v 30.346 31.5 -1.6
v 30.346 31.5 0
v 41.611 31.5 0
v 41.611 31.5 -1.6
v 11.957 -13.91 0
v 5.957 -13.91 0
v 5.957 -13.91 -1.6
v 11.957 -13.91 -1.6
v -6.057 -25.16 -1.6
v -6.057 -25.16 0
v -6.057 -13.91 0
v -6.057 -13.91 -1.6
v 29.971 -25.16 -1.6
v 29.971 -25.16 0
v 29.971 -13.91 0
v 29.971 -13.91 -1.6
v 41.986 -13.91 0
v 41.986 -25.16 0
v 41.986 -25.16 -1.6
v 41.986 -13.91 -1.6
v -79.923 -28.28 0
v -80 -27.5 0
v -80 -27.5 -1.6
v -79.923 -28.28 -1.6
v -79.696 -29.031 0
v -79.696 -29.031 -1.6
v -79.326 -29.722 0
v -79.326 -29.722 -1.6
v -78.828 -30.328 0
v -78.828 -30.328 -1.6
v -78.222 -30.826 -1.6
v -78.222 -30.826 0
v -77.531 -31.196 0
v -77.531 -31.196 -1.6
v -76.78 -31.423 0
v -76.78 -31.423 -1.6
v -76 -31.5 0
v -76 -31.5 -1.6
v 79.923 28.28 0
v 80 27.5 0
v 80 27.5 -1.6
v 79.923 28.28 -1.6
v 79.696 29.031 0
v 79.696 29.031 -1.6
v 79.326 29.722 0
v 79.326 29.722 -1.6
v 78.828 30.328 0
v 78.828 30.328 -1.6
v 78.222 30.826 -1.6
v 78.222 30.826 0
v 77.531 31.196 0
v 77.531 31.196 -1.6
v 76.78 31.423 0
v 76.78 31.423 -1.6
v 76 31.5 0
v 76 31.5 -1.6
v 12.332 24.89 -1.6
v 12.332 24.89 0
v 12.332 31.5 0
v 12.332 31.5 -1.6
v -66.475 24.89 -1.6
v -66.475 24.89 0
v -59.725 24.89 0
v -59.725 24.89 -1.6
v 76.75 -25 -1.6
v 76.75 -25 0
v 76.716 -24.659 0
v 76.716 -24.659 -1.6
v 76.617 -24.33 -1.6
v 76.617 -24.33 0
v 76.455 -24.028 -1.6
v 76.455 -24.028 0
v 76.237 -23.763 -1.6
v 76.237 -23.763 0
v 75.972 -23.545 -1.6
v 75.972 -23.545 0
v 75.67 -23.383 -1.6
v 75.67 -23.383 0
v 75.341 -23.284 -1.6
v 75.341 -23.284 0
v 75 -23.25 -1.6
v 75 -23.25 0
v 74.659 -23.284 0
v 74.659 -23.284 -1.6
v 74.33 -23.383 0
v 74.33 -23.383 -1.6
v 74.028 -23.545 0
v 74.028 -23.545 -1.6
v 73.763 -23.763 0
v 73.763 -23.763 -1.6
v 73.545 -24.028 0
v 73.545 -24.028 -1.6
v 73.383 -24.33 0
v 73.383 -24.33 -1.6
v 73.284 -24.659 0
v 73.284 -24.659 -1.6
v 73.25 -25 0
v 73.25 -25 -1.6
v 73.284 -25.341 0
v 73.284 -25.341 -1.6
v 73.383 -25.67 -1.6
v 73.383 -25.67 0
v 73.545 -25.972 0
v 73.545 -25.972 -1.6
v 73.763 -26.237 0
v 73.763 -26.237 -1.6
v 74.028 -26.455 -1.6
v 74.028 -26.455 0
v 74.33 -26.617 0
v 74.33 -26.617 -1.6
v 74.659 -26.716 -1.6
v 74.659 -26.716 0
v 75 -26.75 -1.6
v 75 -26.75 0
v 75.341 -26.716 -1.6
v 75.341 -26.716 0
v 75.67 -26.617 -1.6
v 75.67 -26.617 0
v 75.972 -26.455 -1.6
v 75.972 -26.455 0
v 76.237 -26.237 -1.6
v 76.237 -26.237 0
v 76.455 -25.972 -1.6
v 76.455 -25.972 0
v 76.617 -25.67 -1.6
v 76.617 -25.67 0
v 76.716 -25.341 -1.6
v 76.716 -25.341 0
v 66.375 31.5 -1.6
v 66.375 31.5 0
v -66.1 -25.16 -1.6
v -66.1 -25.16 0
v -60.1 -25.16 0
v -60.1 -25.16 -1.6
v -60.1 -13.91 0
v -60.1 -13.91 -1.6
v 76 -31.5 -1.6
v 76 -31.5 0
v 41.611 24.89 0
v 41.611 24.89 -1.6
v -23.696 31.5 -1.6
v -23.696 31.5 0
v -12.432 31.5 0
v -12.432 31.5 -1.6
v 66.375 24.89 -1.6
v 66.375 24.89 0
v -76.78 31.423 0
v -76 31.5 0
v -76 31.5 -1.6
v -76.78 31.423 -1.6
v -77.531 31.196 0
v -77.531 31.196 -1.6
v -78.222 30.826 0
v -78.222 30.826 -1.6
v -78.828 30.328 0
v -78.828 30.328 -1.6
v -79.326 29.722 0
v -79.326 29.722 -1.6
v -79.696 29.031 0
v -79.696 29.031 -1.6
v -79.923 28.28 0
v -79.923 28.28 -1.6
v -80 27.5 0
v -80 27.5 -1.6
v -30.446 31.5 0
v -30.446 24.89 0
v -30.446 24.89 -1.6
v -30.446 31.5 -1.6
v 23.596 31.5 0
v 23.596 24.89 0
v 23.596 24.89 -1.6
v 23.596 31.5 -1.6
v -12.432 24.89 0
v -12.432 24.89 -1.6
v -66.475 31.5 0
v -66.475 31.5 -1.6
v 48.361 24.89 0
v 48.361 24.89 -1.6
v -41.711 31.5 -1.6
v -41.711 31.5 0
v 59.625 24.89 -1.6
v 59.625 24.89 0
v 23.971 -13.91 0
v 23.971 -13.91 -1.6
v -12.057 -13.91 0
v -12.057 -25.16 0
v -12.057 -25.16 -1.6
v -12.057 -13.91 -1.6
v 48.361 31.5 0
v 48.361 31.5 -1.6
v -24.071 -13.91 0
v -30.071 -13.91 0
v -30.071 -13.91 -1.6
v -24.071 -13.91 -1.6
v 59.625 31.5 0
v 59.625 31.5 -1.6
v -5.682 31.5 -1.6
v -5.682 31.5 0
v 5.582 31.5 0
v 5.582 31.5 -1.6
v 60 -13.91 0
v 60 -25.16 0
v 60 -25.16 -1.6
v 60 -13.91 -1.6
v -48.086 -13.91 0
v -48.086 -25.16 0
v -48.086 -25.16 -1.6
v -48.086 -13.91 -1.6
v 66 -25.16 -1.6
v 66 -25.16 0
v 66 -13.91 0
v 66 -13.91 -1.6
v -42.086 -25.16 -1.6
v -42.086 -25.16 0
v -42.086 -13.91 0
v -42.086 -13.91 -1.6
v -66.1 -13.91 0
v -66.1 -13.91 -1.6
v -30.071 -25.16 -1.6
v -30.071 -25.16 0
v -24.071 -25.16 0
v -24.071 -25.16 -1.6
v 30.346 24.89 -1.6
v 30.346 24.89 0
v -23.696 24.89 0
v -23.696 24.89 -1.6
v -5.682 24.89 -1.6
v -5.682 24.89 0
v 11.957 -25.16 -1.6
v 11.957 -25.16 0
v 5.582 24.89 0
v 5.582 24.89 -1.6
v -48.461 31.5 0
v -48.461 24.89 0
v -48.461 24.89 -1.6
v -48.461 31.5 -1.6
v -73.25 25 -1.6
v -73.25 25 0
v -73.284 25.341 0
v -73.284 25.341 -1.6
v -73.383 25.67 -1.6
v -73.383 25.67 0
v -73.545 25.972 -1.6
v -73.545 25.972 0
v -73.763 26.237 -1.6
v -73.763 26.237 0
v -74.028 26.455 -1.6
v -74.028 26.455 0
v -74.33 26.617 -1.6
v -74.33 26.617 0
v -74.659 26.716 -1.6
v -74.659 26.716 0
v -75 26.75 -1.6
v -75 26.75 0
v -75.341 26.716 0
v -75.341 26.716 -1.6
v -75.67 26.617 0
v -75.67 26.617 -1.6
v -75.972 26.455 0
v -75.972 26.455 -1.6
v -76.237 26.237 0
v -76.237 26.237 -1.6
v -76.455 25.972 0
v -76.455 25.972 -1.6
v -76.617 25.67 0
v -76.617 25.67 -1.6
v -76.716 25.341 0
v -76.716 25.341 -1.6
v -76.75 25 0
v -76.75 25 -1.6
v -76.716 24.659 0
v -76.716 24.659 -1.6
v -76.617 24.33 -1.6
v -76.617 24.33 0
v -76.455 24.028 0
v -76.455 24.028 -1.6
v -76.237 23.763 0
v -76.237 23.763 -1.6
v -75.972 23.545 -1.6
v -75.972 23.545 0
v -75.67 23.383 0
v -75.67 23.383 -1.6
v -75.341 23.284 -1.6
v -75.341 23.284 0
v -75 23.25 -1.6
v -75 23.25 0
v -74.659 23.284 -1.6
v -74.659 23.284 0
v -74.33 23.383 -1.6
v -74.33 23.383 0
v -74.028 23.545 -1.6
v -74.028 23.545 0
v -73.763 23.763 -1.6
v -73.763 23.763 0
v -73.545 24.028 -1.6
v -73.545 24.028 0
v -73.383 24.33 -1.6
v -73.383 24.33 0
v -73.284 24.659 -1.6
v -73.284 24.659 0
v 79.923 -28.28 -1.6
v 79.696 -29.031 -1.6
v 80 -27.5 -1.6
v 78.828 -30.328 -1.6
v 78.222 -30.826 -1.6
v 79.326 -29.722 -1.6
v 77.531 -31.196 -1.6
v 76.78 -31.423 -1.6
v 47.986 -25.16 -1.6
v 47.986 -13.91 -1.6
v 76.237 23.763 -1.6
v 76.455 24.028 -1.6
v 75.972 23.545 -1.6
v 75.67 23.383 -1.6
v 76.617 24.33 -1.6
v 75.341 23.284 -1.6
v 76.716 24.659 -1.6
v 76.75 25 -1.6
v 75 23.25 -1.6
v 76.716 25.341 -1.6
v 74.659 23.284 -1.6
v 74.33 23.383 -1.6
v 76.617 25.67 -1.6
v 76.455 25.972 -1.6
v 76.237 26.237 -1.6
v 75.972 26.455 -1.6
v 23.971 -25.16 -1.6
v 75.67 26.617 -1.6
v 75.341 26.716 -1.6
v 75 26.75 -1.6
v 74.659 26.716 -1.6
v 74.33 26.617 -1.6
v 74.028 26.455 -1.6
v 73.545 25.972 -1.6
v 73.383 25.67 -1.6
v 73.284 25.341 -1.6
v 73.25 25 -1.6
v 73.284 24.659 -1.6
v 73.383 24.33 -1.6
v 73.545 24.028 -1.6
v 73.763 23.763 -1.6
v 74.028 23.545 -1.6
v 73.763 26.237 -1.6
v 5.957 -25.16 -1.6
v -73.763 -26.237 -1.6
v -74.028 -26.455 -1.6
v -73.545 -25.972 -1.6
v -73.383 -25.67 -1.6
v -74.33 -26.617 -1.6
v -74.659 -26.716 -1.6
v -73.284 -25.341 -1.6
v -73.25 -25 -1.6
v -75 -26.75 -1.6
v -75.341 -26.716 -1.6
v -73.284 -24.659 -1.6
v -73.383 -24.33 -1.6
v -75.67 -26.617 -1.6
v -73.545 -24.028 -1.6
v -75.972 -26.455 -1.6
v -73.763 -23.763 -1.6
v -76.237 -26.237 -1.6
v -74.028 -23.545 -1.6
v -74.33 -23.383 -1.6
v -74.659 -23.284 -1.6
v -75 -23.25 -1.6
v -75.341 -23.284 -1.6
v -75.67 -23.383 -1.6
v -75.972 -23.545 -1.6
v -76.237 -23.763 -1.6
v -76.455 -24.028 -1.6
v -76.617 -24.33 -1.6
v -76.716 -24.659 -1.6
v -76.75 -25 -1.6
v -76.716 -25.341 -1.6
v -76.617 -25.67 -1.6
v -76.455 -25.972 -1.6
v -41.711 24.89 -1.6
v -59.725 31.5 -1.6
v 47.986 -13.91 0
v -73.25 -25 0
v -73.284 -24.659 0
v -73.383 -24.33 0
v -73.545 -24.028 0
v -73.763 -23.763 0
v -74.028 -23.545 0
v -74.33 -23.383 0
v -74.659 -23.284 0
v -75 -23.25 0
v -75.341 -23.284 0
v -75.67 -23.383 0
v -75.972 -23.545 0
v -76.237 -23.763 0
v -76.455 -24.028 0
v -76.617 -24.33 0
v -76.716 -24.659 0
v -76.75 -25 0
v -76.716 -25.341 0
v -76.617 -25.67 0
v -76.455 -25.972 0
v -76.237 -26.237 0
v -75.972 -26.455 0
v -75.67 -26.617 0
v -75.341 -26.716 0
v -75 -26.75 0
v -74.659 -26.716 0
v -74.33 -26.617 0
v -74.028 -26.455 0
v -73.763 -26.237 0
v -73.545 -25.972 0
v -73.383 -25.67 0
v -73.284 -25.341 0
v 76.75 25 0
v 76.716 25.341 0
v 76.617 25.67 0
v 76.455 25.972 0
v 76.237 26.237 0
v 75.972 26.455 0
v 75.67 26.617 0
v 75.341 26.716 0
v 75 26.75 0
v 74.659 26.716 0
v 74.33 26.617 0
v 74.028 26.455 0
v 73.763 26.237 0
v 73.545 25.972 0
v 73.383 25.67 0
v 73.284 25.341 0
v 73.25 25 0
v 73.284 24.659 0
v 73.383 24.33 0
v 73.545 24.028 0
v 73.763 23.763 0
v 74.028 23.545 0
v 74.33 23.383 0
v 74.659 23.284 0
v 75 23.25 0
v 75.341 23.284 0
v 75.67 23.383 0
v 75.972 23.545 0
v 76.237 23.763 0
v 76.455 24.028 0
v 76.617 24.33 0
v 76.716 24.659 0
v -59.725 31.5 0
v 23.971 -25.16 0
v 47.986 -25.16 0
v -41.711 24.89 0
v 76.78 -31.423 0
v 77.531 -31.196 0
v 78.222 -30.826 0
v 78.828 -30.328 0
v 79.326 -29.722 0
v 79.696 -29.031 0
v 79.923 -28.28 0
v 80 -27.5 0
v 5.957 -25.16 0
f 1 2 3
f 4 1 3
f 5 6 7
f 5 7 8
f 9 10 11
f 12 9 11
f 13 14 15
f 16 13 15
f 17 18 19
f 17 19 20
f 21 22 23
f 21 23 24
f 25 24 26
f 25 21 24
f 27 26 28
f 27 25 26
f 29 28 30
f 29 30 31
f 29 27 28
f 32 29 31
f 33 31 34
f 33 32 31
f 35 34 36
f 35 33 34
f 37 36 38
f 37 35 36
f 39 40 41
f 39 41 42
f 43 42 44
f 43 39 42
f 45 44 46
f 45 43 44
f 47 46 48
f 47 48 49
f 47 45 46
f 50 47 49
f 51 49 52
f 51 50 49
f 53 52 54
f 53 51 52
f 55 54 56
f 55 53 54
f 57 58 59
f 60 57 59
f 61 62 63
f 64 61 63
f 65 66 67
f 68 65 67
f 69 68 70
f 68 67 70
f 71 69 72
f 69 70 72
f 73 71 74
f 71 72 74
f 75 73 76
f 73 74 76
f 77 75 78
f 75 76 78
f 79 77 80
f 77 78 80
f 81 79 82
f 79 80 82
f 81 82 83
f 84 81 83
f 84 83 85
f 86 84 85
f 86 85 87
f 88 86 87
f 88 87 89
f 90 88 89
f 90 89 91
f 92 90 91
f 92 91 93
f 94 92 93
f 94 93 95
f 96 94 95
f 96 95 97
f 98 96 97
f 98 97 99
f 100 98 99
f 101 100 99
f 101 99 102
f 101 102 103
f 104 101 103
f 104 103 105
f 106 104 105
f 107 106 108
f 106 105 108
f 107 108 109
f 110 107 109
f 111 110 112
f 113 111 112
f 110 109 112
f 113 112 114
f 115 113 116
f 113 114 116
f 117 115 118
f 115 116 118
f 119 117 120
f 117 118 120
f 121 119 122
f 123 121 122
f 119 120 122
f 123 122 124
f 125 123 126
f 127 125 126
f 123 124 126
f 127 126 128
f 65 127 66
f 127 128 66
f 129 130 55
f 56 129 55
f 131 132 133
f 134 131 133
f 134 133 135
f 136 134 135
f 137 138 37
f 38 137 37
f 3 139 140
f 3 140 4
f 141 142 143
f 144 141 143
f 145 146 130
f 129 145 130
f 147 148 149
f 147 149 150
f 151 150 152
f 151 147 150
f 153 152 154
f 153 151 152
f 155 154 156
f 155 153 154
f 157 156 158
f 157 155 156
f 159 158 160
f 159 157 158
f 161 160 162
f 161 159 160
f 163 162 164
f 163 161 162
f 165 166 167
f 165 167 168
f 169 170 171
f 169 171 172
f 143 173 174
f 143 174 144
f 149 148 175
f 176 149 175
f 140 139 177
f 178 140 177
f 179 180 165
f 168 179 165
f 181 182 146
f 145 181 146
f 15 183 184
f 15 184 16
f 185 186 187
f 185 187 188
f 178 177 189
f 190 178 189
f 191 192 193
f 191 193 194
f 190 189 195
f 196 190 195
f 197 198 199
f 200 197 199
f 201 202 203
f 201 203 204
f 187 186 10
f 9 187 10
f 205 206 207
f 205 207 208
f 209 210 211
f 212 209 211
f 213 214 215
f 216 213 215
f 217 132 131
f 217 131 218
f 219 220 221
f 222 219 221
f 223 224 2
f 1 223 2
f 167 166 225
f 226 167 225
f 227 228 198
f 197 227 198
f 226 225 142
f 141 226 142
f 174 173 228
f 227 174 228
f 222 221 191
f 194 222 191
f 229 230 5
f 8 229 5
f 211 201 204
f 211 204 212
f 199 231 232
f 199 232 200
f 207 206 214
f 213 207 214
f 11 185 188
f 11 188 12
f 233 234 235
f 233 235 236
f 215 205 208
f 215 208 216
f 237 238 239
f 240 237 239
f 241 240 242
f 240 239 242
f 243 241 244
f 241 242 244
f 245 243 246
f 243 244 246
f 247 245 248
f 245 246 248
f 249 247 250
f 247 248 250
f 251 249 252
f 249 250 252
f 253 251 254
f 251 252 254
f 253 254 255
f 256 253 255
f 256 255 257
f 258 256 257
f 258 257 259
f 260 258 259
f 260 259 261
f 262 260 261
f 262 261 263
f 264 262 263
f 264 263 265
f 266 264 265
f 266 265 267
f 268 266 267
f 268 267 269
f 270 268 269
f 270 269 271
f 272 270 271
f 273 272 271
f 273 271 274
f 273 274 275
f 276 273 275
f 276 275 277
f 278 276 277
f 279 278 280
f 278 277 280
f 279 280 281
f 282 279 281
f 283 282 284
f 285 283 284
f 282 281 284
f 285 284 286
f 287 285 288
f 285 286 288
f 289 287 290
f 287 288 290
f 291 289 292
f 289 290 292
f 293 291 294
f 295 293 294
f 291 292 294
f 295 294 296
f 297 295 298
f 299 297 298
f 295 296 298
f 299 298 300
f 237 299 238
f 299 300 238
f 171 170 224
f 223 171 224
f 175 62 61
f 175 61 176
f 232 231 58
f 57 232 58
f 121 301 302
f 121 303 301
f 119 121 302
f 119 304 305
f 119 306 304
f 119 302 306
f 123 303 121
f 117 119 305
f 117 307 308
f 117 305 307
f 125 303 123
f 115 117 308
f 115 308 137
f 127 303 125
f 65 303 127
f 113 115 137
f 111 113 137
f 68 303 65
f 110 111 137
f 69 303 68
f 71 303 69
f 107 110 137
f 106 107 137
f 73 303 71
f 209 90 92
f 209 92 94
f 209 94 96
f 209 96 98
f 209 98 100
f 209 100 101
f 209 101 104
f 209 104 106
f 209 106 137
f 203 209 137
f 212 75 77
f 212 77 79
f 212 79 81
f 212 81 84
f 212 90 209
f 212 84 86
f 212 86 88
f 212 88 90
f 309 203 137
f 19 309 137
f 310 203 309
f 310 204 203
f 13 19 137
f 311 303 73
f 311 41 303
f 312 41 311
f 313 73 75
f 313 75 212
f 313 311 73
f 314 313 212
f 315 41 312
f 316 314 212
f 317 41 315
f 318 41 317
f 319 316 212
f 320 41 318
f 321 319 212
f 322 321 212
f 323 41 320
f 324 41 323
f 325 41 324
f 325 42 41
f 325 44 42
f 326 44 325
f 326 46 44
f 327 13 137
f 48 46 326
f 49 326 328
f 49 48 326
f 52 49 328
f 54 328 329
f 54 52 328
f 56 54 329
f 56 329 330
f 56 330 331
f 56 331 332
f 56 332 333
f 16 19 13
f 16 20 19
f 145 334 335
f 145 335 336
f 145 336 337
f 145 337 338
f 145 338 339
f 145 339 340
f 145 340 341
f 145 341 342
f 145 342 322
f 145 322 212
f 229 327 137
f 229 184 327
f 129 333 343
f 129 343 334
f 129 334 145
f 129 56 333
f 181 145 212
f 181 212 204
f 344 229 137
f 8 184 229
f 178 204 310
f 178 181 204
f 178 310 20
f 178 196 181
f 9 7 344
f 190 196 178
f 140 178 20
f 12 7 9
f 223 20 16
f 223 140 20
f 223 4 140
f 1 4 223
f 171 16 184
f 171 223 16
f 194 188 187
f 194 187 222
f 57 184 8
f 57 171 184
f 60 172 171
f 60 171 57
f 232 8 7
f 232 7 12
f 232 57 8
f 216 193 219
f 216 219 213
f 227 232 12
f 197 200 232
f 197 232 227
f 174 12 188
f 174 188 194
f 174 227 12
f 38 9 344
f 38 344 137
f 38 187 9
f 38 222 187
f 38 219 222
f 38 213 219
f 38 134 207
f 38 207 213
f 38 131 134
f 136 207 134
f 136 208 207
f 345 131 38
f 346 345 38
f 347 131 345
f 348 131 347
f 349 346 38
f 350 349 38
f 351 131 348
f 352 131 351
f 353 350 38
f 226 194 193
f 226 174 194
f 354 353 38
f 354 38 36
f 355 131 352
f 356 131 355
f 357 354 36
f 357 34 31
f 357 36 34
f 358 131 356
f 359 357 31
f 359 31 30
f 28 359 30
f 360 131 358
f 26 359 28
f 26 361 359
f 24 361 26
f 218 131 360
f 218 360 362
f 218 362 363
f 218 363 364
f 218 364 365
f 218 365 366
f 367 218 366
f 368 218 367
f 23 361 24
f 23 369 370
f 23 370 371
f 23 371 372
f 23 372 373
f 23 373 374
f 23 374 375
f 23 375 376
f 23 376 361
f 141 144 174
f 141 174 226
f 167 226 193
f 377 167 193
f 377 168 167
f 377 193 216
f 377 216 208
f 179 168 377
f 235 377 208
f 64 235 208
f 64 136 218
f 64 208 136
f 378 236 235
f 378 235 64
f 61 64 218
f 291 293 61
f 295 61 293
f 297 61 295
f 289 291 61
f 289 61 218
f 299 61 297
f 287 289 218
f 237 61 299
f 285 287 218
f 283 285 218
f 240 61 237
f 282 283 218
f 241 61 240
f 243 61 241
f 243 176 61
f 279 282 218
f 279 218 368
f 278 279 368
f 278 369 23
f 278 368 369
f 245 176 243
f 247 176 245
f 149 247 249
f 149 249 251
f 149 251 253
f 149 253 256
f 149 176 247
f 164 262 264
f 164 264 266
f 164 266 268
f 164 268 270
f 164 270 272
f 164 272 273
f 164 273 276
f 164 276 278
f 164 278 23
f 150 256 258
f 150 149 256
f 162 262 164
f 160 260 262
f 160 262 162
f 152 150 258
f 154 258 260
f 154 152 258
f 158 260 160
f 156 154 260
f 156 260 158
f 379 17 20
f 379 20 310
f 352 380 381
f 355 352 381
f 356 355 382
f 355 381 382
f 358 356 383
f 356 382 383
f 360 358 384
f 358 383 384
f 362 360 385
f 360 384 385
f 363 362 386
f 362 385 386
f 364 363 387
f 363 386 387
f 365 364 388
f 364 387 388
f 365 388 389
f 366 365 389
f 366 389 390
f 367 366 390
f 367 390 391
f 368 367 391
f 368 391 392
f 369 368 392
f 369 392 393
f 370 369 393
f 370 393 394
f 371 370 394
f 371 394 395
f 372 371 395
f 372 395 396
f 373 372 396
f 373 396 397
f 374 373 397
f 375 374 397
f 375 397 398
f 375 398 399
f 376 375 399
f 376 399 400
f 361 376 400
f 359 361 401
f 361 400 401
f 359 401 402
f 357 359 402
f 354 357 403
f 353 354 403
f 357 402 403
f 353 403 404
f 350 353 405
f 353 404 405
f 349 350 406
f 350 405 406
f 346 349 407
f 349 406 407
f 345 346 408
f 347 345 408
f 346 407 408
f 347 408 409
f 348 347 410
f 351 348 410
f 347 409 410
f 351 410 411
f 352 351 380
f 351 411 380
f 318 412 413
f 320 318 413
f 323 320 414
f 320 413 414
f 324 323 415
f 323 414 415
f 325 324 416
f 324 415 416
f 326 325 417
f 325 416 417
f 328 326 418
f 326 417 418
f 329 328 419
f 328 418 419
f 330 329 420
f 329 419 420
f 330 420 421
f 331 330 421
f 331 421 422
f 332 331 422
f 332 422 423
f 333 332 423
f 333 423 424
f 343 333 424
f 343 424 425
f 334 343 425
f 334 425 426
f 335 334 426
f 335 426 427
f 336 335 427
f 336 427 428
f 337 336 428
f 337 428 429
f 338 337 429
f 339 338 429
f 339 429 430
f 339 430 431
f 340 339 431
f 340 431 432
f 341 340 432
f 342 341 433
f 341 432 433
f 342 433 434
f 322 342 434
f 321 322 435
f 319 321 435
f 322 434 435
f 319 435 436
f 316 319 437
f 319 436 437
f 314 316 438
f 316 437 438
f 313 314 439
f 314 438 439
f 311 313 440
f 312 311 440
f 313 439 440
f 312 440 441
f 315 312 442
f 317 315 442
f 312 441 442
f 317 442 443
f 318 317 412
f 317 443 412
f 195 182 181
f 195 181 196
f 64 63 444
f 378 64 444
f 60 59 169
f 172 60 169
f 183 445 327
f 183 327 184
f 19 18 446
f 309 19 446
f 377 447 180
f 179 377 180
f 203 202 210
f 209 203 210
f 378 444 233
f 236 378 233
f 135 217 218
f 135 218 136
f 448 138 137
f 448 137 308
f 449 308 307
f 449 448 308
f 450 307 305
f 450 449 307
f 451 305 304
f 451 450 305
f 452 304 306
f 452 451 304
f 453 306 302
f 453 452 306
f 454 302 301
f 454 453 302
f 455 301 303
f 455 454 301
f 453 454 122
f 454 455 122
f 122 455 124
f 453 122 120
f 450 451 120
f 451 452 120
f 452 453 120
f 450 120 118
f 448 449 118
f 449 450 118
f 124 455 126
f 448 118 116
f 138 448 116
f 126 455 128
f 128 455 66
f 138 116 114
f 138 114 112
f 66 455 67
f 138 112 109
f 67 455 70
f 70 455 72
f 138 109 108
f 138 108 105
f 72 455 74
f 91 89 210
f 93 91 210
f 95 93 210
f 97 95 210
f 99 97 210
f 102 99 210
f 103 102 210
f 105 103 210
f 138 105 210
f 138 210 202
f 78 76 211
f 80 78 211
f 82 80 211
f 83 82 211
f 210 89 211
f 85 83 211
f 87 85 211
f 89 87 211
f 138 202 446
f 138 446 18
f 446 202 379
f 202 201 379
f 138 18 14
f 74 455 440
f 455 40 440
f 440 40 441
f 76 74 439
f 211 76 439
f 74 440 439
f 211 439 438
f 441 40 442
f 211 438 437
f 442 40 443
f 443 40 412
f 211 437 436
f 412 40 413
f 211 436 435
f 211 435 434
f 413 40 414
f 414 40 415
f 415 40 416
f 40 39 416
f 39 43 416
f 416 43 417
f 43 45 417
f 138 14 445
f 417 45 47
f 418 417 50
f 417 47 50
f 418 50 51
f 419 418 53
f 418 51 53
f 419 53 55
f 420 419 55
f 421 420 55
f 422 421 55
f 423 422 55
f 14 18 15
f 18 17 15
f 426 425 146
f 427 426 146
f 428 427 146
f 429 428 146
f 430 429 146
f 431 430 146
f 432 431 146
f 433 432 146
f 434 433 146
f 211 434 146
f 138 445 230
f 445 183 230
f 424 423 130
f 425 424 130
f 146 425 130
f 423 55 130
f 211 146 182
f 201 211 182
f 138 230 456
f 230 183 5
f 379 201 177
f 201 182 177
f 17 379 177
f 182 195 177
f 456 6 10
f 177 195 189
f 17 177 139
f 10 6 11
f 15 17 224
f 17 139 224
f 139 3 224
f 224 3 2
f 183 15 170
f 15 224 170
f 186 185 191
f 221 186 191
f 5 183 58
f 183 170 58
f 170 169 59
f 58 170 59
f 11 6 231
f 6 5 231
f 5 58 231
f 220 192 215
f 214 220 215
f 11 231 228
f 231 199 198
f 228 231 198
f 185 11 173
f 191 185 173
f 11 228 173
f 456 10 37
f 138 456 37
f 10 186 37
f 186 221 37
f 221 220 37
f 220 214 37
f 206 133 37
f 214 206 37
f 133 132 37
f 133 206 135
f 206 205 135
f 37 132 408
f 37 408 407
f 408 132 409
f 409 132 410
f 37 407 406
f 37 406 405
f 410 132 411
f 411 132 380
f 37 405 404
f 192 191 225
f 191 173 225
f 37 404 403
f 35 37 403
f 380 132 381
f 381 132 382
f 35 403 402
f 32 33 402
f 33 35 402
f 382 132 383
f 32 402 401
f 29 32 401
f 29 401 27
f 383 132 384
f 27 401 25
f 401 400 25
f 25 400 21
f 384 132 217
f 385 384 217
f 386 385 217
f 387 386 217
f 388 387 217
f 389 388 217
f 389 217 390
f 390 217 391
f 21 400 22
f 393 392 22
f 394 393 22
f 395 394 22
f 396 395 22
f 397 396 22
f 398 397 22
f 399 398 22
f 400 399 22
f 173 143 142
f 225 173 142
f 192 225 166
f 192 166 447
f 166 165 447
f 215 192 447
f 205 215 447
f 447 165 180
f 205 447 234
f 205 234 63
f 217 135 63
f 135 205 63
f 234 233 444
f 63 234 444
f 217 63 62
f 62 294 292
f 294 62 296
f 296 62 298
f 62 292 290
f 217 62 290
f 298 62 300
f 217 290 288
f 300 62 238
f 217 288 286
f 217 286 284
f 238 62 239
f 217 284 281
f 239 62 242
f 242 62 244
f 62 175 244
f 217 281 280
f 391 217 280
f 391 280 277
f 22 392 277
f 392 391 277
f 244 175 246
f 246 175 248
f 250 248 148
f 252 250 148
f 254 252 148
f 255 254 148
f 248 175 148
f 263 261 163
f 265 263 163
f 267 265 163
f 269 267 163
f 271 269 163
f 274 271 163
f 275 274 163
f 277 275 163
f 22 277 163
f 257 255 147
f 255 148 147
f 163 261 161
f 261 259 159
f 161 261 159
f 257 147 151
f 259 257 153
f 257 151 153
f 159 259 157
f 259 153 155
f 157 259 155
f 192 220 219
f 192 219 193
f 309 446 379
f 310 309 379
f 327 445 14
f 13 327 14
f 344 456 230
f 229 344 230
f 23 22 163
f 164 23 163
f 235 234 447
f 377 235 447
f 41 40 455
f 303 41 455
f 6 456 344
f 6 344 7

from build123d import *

# Parameters (mm, degrees)
PAD_DEPTH              = 1.6
SKETCH001_R            = 1.75
POCKET_DEPTH           = 5
SKETCH003_W            = 6
SKETCH003_H            = 11.25
POCKET001_DEPTH        = 5
LINEARPATTERN_COUNT    = 8
LINEARPATTERN_PITCH    = 18.014286
SKETCH004_W            = 6.75
SKETCH004_H            = 7.75
POCKET002_DEPTH        = 5
LINEARPATTERN001_COUNT = 8
LINEARPATTERN001_PITCH = 18.014286


with BuildPart() as part:
    # Sketch → Pad (new body)
    with BuildSketch(Plane.XY):
        with BuildLine():
            Line((-76, 31.5), (76, 31.5))
            ThreePointArc((80, 27.5), (78.828427, 30.328427), (76, 31.5))
            Line((80, 27.5), (80, -27.5))
            ThreePointArc((76, -31.5), (78.828427, -30.328427), (80, -27.5))
            Line((76, -31.5), (-76, -31.5))
            ThreePointArc((-80, -27.5), (-78.828427, -30.328427), (-76, -31.5))
            Line((-80, -27.5), (-80, 27.5))
            ThreePointArc((-76, 31.5), (-78.828427, 30.328427), (-80, 27.5))
        make_face()
    extrude(amount=-PAD_DEPTH)

    # Sketch001 → Pocket (cut)
    with BuildSketch(Plane.XY):
        with Locations((75, 25)):
            Circle(SKETCH001_R)
        with Locations((-75, 25)):
            Circle(SKETCH001_R)
        with Locations((75, -25)):
            Circle(SKETCH001_R)
        with Locations((-75, -25)):
            Circle(SKETCH001_R)
    extrude(amount=-POCKET_DEPTH, mode=Mode.SUBTRACT)

    # Sketch003 → Pocket001 (cut)
    with BuildSketch(Plane.XY):
        with Locations((63, -19.535)):
            Rectangle(SKETCH003_W, SKETCH003_H)
    pocket001 = extrude(amount=-POCKET001_DEPTH, mode=Mode.SUBTRACT)

    # LinearPattern: Pocket001 ×8
    with Locations(*[(-i * LINEARPATTERN_PITCH, 0, 0) for i in range(1, LINEARPATTERN_COUNT)]):
        add(pocket001, mode=Mode.SUBTRACT)

    # Sketch004 → Pocket002 (cut)
    with BuildSketch(Plane.XY):
        with Locations((63, 28.765)):
            Rectangle(SKETCH004_W, SKETCH004_H)
    pocket002 = extrude(amount=-POCKET002_DEPTH, mode=Mode.SUBTRACT)

    # LinearPattern001: Pocket002 ×8
    with Locations(*[(-i * LINEARPATTERN001_PITCH, 0, 0) for i in range(1, LINEARPATTERN001_COUNT)]):
        add(pocket002, mode=Mode.SUBTRACT)


solid = part.part
